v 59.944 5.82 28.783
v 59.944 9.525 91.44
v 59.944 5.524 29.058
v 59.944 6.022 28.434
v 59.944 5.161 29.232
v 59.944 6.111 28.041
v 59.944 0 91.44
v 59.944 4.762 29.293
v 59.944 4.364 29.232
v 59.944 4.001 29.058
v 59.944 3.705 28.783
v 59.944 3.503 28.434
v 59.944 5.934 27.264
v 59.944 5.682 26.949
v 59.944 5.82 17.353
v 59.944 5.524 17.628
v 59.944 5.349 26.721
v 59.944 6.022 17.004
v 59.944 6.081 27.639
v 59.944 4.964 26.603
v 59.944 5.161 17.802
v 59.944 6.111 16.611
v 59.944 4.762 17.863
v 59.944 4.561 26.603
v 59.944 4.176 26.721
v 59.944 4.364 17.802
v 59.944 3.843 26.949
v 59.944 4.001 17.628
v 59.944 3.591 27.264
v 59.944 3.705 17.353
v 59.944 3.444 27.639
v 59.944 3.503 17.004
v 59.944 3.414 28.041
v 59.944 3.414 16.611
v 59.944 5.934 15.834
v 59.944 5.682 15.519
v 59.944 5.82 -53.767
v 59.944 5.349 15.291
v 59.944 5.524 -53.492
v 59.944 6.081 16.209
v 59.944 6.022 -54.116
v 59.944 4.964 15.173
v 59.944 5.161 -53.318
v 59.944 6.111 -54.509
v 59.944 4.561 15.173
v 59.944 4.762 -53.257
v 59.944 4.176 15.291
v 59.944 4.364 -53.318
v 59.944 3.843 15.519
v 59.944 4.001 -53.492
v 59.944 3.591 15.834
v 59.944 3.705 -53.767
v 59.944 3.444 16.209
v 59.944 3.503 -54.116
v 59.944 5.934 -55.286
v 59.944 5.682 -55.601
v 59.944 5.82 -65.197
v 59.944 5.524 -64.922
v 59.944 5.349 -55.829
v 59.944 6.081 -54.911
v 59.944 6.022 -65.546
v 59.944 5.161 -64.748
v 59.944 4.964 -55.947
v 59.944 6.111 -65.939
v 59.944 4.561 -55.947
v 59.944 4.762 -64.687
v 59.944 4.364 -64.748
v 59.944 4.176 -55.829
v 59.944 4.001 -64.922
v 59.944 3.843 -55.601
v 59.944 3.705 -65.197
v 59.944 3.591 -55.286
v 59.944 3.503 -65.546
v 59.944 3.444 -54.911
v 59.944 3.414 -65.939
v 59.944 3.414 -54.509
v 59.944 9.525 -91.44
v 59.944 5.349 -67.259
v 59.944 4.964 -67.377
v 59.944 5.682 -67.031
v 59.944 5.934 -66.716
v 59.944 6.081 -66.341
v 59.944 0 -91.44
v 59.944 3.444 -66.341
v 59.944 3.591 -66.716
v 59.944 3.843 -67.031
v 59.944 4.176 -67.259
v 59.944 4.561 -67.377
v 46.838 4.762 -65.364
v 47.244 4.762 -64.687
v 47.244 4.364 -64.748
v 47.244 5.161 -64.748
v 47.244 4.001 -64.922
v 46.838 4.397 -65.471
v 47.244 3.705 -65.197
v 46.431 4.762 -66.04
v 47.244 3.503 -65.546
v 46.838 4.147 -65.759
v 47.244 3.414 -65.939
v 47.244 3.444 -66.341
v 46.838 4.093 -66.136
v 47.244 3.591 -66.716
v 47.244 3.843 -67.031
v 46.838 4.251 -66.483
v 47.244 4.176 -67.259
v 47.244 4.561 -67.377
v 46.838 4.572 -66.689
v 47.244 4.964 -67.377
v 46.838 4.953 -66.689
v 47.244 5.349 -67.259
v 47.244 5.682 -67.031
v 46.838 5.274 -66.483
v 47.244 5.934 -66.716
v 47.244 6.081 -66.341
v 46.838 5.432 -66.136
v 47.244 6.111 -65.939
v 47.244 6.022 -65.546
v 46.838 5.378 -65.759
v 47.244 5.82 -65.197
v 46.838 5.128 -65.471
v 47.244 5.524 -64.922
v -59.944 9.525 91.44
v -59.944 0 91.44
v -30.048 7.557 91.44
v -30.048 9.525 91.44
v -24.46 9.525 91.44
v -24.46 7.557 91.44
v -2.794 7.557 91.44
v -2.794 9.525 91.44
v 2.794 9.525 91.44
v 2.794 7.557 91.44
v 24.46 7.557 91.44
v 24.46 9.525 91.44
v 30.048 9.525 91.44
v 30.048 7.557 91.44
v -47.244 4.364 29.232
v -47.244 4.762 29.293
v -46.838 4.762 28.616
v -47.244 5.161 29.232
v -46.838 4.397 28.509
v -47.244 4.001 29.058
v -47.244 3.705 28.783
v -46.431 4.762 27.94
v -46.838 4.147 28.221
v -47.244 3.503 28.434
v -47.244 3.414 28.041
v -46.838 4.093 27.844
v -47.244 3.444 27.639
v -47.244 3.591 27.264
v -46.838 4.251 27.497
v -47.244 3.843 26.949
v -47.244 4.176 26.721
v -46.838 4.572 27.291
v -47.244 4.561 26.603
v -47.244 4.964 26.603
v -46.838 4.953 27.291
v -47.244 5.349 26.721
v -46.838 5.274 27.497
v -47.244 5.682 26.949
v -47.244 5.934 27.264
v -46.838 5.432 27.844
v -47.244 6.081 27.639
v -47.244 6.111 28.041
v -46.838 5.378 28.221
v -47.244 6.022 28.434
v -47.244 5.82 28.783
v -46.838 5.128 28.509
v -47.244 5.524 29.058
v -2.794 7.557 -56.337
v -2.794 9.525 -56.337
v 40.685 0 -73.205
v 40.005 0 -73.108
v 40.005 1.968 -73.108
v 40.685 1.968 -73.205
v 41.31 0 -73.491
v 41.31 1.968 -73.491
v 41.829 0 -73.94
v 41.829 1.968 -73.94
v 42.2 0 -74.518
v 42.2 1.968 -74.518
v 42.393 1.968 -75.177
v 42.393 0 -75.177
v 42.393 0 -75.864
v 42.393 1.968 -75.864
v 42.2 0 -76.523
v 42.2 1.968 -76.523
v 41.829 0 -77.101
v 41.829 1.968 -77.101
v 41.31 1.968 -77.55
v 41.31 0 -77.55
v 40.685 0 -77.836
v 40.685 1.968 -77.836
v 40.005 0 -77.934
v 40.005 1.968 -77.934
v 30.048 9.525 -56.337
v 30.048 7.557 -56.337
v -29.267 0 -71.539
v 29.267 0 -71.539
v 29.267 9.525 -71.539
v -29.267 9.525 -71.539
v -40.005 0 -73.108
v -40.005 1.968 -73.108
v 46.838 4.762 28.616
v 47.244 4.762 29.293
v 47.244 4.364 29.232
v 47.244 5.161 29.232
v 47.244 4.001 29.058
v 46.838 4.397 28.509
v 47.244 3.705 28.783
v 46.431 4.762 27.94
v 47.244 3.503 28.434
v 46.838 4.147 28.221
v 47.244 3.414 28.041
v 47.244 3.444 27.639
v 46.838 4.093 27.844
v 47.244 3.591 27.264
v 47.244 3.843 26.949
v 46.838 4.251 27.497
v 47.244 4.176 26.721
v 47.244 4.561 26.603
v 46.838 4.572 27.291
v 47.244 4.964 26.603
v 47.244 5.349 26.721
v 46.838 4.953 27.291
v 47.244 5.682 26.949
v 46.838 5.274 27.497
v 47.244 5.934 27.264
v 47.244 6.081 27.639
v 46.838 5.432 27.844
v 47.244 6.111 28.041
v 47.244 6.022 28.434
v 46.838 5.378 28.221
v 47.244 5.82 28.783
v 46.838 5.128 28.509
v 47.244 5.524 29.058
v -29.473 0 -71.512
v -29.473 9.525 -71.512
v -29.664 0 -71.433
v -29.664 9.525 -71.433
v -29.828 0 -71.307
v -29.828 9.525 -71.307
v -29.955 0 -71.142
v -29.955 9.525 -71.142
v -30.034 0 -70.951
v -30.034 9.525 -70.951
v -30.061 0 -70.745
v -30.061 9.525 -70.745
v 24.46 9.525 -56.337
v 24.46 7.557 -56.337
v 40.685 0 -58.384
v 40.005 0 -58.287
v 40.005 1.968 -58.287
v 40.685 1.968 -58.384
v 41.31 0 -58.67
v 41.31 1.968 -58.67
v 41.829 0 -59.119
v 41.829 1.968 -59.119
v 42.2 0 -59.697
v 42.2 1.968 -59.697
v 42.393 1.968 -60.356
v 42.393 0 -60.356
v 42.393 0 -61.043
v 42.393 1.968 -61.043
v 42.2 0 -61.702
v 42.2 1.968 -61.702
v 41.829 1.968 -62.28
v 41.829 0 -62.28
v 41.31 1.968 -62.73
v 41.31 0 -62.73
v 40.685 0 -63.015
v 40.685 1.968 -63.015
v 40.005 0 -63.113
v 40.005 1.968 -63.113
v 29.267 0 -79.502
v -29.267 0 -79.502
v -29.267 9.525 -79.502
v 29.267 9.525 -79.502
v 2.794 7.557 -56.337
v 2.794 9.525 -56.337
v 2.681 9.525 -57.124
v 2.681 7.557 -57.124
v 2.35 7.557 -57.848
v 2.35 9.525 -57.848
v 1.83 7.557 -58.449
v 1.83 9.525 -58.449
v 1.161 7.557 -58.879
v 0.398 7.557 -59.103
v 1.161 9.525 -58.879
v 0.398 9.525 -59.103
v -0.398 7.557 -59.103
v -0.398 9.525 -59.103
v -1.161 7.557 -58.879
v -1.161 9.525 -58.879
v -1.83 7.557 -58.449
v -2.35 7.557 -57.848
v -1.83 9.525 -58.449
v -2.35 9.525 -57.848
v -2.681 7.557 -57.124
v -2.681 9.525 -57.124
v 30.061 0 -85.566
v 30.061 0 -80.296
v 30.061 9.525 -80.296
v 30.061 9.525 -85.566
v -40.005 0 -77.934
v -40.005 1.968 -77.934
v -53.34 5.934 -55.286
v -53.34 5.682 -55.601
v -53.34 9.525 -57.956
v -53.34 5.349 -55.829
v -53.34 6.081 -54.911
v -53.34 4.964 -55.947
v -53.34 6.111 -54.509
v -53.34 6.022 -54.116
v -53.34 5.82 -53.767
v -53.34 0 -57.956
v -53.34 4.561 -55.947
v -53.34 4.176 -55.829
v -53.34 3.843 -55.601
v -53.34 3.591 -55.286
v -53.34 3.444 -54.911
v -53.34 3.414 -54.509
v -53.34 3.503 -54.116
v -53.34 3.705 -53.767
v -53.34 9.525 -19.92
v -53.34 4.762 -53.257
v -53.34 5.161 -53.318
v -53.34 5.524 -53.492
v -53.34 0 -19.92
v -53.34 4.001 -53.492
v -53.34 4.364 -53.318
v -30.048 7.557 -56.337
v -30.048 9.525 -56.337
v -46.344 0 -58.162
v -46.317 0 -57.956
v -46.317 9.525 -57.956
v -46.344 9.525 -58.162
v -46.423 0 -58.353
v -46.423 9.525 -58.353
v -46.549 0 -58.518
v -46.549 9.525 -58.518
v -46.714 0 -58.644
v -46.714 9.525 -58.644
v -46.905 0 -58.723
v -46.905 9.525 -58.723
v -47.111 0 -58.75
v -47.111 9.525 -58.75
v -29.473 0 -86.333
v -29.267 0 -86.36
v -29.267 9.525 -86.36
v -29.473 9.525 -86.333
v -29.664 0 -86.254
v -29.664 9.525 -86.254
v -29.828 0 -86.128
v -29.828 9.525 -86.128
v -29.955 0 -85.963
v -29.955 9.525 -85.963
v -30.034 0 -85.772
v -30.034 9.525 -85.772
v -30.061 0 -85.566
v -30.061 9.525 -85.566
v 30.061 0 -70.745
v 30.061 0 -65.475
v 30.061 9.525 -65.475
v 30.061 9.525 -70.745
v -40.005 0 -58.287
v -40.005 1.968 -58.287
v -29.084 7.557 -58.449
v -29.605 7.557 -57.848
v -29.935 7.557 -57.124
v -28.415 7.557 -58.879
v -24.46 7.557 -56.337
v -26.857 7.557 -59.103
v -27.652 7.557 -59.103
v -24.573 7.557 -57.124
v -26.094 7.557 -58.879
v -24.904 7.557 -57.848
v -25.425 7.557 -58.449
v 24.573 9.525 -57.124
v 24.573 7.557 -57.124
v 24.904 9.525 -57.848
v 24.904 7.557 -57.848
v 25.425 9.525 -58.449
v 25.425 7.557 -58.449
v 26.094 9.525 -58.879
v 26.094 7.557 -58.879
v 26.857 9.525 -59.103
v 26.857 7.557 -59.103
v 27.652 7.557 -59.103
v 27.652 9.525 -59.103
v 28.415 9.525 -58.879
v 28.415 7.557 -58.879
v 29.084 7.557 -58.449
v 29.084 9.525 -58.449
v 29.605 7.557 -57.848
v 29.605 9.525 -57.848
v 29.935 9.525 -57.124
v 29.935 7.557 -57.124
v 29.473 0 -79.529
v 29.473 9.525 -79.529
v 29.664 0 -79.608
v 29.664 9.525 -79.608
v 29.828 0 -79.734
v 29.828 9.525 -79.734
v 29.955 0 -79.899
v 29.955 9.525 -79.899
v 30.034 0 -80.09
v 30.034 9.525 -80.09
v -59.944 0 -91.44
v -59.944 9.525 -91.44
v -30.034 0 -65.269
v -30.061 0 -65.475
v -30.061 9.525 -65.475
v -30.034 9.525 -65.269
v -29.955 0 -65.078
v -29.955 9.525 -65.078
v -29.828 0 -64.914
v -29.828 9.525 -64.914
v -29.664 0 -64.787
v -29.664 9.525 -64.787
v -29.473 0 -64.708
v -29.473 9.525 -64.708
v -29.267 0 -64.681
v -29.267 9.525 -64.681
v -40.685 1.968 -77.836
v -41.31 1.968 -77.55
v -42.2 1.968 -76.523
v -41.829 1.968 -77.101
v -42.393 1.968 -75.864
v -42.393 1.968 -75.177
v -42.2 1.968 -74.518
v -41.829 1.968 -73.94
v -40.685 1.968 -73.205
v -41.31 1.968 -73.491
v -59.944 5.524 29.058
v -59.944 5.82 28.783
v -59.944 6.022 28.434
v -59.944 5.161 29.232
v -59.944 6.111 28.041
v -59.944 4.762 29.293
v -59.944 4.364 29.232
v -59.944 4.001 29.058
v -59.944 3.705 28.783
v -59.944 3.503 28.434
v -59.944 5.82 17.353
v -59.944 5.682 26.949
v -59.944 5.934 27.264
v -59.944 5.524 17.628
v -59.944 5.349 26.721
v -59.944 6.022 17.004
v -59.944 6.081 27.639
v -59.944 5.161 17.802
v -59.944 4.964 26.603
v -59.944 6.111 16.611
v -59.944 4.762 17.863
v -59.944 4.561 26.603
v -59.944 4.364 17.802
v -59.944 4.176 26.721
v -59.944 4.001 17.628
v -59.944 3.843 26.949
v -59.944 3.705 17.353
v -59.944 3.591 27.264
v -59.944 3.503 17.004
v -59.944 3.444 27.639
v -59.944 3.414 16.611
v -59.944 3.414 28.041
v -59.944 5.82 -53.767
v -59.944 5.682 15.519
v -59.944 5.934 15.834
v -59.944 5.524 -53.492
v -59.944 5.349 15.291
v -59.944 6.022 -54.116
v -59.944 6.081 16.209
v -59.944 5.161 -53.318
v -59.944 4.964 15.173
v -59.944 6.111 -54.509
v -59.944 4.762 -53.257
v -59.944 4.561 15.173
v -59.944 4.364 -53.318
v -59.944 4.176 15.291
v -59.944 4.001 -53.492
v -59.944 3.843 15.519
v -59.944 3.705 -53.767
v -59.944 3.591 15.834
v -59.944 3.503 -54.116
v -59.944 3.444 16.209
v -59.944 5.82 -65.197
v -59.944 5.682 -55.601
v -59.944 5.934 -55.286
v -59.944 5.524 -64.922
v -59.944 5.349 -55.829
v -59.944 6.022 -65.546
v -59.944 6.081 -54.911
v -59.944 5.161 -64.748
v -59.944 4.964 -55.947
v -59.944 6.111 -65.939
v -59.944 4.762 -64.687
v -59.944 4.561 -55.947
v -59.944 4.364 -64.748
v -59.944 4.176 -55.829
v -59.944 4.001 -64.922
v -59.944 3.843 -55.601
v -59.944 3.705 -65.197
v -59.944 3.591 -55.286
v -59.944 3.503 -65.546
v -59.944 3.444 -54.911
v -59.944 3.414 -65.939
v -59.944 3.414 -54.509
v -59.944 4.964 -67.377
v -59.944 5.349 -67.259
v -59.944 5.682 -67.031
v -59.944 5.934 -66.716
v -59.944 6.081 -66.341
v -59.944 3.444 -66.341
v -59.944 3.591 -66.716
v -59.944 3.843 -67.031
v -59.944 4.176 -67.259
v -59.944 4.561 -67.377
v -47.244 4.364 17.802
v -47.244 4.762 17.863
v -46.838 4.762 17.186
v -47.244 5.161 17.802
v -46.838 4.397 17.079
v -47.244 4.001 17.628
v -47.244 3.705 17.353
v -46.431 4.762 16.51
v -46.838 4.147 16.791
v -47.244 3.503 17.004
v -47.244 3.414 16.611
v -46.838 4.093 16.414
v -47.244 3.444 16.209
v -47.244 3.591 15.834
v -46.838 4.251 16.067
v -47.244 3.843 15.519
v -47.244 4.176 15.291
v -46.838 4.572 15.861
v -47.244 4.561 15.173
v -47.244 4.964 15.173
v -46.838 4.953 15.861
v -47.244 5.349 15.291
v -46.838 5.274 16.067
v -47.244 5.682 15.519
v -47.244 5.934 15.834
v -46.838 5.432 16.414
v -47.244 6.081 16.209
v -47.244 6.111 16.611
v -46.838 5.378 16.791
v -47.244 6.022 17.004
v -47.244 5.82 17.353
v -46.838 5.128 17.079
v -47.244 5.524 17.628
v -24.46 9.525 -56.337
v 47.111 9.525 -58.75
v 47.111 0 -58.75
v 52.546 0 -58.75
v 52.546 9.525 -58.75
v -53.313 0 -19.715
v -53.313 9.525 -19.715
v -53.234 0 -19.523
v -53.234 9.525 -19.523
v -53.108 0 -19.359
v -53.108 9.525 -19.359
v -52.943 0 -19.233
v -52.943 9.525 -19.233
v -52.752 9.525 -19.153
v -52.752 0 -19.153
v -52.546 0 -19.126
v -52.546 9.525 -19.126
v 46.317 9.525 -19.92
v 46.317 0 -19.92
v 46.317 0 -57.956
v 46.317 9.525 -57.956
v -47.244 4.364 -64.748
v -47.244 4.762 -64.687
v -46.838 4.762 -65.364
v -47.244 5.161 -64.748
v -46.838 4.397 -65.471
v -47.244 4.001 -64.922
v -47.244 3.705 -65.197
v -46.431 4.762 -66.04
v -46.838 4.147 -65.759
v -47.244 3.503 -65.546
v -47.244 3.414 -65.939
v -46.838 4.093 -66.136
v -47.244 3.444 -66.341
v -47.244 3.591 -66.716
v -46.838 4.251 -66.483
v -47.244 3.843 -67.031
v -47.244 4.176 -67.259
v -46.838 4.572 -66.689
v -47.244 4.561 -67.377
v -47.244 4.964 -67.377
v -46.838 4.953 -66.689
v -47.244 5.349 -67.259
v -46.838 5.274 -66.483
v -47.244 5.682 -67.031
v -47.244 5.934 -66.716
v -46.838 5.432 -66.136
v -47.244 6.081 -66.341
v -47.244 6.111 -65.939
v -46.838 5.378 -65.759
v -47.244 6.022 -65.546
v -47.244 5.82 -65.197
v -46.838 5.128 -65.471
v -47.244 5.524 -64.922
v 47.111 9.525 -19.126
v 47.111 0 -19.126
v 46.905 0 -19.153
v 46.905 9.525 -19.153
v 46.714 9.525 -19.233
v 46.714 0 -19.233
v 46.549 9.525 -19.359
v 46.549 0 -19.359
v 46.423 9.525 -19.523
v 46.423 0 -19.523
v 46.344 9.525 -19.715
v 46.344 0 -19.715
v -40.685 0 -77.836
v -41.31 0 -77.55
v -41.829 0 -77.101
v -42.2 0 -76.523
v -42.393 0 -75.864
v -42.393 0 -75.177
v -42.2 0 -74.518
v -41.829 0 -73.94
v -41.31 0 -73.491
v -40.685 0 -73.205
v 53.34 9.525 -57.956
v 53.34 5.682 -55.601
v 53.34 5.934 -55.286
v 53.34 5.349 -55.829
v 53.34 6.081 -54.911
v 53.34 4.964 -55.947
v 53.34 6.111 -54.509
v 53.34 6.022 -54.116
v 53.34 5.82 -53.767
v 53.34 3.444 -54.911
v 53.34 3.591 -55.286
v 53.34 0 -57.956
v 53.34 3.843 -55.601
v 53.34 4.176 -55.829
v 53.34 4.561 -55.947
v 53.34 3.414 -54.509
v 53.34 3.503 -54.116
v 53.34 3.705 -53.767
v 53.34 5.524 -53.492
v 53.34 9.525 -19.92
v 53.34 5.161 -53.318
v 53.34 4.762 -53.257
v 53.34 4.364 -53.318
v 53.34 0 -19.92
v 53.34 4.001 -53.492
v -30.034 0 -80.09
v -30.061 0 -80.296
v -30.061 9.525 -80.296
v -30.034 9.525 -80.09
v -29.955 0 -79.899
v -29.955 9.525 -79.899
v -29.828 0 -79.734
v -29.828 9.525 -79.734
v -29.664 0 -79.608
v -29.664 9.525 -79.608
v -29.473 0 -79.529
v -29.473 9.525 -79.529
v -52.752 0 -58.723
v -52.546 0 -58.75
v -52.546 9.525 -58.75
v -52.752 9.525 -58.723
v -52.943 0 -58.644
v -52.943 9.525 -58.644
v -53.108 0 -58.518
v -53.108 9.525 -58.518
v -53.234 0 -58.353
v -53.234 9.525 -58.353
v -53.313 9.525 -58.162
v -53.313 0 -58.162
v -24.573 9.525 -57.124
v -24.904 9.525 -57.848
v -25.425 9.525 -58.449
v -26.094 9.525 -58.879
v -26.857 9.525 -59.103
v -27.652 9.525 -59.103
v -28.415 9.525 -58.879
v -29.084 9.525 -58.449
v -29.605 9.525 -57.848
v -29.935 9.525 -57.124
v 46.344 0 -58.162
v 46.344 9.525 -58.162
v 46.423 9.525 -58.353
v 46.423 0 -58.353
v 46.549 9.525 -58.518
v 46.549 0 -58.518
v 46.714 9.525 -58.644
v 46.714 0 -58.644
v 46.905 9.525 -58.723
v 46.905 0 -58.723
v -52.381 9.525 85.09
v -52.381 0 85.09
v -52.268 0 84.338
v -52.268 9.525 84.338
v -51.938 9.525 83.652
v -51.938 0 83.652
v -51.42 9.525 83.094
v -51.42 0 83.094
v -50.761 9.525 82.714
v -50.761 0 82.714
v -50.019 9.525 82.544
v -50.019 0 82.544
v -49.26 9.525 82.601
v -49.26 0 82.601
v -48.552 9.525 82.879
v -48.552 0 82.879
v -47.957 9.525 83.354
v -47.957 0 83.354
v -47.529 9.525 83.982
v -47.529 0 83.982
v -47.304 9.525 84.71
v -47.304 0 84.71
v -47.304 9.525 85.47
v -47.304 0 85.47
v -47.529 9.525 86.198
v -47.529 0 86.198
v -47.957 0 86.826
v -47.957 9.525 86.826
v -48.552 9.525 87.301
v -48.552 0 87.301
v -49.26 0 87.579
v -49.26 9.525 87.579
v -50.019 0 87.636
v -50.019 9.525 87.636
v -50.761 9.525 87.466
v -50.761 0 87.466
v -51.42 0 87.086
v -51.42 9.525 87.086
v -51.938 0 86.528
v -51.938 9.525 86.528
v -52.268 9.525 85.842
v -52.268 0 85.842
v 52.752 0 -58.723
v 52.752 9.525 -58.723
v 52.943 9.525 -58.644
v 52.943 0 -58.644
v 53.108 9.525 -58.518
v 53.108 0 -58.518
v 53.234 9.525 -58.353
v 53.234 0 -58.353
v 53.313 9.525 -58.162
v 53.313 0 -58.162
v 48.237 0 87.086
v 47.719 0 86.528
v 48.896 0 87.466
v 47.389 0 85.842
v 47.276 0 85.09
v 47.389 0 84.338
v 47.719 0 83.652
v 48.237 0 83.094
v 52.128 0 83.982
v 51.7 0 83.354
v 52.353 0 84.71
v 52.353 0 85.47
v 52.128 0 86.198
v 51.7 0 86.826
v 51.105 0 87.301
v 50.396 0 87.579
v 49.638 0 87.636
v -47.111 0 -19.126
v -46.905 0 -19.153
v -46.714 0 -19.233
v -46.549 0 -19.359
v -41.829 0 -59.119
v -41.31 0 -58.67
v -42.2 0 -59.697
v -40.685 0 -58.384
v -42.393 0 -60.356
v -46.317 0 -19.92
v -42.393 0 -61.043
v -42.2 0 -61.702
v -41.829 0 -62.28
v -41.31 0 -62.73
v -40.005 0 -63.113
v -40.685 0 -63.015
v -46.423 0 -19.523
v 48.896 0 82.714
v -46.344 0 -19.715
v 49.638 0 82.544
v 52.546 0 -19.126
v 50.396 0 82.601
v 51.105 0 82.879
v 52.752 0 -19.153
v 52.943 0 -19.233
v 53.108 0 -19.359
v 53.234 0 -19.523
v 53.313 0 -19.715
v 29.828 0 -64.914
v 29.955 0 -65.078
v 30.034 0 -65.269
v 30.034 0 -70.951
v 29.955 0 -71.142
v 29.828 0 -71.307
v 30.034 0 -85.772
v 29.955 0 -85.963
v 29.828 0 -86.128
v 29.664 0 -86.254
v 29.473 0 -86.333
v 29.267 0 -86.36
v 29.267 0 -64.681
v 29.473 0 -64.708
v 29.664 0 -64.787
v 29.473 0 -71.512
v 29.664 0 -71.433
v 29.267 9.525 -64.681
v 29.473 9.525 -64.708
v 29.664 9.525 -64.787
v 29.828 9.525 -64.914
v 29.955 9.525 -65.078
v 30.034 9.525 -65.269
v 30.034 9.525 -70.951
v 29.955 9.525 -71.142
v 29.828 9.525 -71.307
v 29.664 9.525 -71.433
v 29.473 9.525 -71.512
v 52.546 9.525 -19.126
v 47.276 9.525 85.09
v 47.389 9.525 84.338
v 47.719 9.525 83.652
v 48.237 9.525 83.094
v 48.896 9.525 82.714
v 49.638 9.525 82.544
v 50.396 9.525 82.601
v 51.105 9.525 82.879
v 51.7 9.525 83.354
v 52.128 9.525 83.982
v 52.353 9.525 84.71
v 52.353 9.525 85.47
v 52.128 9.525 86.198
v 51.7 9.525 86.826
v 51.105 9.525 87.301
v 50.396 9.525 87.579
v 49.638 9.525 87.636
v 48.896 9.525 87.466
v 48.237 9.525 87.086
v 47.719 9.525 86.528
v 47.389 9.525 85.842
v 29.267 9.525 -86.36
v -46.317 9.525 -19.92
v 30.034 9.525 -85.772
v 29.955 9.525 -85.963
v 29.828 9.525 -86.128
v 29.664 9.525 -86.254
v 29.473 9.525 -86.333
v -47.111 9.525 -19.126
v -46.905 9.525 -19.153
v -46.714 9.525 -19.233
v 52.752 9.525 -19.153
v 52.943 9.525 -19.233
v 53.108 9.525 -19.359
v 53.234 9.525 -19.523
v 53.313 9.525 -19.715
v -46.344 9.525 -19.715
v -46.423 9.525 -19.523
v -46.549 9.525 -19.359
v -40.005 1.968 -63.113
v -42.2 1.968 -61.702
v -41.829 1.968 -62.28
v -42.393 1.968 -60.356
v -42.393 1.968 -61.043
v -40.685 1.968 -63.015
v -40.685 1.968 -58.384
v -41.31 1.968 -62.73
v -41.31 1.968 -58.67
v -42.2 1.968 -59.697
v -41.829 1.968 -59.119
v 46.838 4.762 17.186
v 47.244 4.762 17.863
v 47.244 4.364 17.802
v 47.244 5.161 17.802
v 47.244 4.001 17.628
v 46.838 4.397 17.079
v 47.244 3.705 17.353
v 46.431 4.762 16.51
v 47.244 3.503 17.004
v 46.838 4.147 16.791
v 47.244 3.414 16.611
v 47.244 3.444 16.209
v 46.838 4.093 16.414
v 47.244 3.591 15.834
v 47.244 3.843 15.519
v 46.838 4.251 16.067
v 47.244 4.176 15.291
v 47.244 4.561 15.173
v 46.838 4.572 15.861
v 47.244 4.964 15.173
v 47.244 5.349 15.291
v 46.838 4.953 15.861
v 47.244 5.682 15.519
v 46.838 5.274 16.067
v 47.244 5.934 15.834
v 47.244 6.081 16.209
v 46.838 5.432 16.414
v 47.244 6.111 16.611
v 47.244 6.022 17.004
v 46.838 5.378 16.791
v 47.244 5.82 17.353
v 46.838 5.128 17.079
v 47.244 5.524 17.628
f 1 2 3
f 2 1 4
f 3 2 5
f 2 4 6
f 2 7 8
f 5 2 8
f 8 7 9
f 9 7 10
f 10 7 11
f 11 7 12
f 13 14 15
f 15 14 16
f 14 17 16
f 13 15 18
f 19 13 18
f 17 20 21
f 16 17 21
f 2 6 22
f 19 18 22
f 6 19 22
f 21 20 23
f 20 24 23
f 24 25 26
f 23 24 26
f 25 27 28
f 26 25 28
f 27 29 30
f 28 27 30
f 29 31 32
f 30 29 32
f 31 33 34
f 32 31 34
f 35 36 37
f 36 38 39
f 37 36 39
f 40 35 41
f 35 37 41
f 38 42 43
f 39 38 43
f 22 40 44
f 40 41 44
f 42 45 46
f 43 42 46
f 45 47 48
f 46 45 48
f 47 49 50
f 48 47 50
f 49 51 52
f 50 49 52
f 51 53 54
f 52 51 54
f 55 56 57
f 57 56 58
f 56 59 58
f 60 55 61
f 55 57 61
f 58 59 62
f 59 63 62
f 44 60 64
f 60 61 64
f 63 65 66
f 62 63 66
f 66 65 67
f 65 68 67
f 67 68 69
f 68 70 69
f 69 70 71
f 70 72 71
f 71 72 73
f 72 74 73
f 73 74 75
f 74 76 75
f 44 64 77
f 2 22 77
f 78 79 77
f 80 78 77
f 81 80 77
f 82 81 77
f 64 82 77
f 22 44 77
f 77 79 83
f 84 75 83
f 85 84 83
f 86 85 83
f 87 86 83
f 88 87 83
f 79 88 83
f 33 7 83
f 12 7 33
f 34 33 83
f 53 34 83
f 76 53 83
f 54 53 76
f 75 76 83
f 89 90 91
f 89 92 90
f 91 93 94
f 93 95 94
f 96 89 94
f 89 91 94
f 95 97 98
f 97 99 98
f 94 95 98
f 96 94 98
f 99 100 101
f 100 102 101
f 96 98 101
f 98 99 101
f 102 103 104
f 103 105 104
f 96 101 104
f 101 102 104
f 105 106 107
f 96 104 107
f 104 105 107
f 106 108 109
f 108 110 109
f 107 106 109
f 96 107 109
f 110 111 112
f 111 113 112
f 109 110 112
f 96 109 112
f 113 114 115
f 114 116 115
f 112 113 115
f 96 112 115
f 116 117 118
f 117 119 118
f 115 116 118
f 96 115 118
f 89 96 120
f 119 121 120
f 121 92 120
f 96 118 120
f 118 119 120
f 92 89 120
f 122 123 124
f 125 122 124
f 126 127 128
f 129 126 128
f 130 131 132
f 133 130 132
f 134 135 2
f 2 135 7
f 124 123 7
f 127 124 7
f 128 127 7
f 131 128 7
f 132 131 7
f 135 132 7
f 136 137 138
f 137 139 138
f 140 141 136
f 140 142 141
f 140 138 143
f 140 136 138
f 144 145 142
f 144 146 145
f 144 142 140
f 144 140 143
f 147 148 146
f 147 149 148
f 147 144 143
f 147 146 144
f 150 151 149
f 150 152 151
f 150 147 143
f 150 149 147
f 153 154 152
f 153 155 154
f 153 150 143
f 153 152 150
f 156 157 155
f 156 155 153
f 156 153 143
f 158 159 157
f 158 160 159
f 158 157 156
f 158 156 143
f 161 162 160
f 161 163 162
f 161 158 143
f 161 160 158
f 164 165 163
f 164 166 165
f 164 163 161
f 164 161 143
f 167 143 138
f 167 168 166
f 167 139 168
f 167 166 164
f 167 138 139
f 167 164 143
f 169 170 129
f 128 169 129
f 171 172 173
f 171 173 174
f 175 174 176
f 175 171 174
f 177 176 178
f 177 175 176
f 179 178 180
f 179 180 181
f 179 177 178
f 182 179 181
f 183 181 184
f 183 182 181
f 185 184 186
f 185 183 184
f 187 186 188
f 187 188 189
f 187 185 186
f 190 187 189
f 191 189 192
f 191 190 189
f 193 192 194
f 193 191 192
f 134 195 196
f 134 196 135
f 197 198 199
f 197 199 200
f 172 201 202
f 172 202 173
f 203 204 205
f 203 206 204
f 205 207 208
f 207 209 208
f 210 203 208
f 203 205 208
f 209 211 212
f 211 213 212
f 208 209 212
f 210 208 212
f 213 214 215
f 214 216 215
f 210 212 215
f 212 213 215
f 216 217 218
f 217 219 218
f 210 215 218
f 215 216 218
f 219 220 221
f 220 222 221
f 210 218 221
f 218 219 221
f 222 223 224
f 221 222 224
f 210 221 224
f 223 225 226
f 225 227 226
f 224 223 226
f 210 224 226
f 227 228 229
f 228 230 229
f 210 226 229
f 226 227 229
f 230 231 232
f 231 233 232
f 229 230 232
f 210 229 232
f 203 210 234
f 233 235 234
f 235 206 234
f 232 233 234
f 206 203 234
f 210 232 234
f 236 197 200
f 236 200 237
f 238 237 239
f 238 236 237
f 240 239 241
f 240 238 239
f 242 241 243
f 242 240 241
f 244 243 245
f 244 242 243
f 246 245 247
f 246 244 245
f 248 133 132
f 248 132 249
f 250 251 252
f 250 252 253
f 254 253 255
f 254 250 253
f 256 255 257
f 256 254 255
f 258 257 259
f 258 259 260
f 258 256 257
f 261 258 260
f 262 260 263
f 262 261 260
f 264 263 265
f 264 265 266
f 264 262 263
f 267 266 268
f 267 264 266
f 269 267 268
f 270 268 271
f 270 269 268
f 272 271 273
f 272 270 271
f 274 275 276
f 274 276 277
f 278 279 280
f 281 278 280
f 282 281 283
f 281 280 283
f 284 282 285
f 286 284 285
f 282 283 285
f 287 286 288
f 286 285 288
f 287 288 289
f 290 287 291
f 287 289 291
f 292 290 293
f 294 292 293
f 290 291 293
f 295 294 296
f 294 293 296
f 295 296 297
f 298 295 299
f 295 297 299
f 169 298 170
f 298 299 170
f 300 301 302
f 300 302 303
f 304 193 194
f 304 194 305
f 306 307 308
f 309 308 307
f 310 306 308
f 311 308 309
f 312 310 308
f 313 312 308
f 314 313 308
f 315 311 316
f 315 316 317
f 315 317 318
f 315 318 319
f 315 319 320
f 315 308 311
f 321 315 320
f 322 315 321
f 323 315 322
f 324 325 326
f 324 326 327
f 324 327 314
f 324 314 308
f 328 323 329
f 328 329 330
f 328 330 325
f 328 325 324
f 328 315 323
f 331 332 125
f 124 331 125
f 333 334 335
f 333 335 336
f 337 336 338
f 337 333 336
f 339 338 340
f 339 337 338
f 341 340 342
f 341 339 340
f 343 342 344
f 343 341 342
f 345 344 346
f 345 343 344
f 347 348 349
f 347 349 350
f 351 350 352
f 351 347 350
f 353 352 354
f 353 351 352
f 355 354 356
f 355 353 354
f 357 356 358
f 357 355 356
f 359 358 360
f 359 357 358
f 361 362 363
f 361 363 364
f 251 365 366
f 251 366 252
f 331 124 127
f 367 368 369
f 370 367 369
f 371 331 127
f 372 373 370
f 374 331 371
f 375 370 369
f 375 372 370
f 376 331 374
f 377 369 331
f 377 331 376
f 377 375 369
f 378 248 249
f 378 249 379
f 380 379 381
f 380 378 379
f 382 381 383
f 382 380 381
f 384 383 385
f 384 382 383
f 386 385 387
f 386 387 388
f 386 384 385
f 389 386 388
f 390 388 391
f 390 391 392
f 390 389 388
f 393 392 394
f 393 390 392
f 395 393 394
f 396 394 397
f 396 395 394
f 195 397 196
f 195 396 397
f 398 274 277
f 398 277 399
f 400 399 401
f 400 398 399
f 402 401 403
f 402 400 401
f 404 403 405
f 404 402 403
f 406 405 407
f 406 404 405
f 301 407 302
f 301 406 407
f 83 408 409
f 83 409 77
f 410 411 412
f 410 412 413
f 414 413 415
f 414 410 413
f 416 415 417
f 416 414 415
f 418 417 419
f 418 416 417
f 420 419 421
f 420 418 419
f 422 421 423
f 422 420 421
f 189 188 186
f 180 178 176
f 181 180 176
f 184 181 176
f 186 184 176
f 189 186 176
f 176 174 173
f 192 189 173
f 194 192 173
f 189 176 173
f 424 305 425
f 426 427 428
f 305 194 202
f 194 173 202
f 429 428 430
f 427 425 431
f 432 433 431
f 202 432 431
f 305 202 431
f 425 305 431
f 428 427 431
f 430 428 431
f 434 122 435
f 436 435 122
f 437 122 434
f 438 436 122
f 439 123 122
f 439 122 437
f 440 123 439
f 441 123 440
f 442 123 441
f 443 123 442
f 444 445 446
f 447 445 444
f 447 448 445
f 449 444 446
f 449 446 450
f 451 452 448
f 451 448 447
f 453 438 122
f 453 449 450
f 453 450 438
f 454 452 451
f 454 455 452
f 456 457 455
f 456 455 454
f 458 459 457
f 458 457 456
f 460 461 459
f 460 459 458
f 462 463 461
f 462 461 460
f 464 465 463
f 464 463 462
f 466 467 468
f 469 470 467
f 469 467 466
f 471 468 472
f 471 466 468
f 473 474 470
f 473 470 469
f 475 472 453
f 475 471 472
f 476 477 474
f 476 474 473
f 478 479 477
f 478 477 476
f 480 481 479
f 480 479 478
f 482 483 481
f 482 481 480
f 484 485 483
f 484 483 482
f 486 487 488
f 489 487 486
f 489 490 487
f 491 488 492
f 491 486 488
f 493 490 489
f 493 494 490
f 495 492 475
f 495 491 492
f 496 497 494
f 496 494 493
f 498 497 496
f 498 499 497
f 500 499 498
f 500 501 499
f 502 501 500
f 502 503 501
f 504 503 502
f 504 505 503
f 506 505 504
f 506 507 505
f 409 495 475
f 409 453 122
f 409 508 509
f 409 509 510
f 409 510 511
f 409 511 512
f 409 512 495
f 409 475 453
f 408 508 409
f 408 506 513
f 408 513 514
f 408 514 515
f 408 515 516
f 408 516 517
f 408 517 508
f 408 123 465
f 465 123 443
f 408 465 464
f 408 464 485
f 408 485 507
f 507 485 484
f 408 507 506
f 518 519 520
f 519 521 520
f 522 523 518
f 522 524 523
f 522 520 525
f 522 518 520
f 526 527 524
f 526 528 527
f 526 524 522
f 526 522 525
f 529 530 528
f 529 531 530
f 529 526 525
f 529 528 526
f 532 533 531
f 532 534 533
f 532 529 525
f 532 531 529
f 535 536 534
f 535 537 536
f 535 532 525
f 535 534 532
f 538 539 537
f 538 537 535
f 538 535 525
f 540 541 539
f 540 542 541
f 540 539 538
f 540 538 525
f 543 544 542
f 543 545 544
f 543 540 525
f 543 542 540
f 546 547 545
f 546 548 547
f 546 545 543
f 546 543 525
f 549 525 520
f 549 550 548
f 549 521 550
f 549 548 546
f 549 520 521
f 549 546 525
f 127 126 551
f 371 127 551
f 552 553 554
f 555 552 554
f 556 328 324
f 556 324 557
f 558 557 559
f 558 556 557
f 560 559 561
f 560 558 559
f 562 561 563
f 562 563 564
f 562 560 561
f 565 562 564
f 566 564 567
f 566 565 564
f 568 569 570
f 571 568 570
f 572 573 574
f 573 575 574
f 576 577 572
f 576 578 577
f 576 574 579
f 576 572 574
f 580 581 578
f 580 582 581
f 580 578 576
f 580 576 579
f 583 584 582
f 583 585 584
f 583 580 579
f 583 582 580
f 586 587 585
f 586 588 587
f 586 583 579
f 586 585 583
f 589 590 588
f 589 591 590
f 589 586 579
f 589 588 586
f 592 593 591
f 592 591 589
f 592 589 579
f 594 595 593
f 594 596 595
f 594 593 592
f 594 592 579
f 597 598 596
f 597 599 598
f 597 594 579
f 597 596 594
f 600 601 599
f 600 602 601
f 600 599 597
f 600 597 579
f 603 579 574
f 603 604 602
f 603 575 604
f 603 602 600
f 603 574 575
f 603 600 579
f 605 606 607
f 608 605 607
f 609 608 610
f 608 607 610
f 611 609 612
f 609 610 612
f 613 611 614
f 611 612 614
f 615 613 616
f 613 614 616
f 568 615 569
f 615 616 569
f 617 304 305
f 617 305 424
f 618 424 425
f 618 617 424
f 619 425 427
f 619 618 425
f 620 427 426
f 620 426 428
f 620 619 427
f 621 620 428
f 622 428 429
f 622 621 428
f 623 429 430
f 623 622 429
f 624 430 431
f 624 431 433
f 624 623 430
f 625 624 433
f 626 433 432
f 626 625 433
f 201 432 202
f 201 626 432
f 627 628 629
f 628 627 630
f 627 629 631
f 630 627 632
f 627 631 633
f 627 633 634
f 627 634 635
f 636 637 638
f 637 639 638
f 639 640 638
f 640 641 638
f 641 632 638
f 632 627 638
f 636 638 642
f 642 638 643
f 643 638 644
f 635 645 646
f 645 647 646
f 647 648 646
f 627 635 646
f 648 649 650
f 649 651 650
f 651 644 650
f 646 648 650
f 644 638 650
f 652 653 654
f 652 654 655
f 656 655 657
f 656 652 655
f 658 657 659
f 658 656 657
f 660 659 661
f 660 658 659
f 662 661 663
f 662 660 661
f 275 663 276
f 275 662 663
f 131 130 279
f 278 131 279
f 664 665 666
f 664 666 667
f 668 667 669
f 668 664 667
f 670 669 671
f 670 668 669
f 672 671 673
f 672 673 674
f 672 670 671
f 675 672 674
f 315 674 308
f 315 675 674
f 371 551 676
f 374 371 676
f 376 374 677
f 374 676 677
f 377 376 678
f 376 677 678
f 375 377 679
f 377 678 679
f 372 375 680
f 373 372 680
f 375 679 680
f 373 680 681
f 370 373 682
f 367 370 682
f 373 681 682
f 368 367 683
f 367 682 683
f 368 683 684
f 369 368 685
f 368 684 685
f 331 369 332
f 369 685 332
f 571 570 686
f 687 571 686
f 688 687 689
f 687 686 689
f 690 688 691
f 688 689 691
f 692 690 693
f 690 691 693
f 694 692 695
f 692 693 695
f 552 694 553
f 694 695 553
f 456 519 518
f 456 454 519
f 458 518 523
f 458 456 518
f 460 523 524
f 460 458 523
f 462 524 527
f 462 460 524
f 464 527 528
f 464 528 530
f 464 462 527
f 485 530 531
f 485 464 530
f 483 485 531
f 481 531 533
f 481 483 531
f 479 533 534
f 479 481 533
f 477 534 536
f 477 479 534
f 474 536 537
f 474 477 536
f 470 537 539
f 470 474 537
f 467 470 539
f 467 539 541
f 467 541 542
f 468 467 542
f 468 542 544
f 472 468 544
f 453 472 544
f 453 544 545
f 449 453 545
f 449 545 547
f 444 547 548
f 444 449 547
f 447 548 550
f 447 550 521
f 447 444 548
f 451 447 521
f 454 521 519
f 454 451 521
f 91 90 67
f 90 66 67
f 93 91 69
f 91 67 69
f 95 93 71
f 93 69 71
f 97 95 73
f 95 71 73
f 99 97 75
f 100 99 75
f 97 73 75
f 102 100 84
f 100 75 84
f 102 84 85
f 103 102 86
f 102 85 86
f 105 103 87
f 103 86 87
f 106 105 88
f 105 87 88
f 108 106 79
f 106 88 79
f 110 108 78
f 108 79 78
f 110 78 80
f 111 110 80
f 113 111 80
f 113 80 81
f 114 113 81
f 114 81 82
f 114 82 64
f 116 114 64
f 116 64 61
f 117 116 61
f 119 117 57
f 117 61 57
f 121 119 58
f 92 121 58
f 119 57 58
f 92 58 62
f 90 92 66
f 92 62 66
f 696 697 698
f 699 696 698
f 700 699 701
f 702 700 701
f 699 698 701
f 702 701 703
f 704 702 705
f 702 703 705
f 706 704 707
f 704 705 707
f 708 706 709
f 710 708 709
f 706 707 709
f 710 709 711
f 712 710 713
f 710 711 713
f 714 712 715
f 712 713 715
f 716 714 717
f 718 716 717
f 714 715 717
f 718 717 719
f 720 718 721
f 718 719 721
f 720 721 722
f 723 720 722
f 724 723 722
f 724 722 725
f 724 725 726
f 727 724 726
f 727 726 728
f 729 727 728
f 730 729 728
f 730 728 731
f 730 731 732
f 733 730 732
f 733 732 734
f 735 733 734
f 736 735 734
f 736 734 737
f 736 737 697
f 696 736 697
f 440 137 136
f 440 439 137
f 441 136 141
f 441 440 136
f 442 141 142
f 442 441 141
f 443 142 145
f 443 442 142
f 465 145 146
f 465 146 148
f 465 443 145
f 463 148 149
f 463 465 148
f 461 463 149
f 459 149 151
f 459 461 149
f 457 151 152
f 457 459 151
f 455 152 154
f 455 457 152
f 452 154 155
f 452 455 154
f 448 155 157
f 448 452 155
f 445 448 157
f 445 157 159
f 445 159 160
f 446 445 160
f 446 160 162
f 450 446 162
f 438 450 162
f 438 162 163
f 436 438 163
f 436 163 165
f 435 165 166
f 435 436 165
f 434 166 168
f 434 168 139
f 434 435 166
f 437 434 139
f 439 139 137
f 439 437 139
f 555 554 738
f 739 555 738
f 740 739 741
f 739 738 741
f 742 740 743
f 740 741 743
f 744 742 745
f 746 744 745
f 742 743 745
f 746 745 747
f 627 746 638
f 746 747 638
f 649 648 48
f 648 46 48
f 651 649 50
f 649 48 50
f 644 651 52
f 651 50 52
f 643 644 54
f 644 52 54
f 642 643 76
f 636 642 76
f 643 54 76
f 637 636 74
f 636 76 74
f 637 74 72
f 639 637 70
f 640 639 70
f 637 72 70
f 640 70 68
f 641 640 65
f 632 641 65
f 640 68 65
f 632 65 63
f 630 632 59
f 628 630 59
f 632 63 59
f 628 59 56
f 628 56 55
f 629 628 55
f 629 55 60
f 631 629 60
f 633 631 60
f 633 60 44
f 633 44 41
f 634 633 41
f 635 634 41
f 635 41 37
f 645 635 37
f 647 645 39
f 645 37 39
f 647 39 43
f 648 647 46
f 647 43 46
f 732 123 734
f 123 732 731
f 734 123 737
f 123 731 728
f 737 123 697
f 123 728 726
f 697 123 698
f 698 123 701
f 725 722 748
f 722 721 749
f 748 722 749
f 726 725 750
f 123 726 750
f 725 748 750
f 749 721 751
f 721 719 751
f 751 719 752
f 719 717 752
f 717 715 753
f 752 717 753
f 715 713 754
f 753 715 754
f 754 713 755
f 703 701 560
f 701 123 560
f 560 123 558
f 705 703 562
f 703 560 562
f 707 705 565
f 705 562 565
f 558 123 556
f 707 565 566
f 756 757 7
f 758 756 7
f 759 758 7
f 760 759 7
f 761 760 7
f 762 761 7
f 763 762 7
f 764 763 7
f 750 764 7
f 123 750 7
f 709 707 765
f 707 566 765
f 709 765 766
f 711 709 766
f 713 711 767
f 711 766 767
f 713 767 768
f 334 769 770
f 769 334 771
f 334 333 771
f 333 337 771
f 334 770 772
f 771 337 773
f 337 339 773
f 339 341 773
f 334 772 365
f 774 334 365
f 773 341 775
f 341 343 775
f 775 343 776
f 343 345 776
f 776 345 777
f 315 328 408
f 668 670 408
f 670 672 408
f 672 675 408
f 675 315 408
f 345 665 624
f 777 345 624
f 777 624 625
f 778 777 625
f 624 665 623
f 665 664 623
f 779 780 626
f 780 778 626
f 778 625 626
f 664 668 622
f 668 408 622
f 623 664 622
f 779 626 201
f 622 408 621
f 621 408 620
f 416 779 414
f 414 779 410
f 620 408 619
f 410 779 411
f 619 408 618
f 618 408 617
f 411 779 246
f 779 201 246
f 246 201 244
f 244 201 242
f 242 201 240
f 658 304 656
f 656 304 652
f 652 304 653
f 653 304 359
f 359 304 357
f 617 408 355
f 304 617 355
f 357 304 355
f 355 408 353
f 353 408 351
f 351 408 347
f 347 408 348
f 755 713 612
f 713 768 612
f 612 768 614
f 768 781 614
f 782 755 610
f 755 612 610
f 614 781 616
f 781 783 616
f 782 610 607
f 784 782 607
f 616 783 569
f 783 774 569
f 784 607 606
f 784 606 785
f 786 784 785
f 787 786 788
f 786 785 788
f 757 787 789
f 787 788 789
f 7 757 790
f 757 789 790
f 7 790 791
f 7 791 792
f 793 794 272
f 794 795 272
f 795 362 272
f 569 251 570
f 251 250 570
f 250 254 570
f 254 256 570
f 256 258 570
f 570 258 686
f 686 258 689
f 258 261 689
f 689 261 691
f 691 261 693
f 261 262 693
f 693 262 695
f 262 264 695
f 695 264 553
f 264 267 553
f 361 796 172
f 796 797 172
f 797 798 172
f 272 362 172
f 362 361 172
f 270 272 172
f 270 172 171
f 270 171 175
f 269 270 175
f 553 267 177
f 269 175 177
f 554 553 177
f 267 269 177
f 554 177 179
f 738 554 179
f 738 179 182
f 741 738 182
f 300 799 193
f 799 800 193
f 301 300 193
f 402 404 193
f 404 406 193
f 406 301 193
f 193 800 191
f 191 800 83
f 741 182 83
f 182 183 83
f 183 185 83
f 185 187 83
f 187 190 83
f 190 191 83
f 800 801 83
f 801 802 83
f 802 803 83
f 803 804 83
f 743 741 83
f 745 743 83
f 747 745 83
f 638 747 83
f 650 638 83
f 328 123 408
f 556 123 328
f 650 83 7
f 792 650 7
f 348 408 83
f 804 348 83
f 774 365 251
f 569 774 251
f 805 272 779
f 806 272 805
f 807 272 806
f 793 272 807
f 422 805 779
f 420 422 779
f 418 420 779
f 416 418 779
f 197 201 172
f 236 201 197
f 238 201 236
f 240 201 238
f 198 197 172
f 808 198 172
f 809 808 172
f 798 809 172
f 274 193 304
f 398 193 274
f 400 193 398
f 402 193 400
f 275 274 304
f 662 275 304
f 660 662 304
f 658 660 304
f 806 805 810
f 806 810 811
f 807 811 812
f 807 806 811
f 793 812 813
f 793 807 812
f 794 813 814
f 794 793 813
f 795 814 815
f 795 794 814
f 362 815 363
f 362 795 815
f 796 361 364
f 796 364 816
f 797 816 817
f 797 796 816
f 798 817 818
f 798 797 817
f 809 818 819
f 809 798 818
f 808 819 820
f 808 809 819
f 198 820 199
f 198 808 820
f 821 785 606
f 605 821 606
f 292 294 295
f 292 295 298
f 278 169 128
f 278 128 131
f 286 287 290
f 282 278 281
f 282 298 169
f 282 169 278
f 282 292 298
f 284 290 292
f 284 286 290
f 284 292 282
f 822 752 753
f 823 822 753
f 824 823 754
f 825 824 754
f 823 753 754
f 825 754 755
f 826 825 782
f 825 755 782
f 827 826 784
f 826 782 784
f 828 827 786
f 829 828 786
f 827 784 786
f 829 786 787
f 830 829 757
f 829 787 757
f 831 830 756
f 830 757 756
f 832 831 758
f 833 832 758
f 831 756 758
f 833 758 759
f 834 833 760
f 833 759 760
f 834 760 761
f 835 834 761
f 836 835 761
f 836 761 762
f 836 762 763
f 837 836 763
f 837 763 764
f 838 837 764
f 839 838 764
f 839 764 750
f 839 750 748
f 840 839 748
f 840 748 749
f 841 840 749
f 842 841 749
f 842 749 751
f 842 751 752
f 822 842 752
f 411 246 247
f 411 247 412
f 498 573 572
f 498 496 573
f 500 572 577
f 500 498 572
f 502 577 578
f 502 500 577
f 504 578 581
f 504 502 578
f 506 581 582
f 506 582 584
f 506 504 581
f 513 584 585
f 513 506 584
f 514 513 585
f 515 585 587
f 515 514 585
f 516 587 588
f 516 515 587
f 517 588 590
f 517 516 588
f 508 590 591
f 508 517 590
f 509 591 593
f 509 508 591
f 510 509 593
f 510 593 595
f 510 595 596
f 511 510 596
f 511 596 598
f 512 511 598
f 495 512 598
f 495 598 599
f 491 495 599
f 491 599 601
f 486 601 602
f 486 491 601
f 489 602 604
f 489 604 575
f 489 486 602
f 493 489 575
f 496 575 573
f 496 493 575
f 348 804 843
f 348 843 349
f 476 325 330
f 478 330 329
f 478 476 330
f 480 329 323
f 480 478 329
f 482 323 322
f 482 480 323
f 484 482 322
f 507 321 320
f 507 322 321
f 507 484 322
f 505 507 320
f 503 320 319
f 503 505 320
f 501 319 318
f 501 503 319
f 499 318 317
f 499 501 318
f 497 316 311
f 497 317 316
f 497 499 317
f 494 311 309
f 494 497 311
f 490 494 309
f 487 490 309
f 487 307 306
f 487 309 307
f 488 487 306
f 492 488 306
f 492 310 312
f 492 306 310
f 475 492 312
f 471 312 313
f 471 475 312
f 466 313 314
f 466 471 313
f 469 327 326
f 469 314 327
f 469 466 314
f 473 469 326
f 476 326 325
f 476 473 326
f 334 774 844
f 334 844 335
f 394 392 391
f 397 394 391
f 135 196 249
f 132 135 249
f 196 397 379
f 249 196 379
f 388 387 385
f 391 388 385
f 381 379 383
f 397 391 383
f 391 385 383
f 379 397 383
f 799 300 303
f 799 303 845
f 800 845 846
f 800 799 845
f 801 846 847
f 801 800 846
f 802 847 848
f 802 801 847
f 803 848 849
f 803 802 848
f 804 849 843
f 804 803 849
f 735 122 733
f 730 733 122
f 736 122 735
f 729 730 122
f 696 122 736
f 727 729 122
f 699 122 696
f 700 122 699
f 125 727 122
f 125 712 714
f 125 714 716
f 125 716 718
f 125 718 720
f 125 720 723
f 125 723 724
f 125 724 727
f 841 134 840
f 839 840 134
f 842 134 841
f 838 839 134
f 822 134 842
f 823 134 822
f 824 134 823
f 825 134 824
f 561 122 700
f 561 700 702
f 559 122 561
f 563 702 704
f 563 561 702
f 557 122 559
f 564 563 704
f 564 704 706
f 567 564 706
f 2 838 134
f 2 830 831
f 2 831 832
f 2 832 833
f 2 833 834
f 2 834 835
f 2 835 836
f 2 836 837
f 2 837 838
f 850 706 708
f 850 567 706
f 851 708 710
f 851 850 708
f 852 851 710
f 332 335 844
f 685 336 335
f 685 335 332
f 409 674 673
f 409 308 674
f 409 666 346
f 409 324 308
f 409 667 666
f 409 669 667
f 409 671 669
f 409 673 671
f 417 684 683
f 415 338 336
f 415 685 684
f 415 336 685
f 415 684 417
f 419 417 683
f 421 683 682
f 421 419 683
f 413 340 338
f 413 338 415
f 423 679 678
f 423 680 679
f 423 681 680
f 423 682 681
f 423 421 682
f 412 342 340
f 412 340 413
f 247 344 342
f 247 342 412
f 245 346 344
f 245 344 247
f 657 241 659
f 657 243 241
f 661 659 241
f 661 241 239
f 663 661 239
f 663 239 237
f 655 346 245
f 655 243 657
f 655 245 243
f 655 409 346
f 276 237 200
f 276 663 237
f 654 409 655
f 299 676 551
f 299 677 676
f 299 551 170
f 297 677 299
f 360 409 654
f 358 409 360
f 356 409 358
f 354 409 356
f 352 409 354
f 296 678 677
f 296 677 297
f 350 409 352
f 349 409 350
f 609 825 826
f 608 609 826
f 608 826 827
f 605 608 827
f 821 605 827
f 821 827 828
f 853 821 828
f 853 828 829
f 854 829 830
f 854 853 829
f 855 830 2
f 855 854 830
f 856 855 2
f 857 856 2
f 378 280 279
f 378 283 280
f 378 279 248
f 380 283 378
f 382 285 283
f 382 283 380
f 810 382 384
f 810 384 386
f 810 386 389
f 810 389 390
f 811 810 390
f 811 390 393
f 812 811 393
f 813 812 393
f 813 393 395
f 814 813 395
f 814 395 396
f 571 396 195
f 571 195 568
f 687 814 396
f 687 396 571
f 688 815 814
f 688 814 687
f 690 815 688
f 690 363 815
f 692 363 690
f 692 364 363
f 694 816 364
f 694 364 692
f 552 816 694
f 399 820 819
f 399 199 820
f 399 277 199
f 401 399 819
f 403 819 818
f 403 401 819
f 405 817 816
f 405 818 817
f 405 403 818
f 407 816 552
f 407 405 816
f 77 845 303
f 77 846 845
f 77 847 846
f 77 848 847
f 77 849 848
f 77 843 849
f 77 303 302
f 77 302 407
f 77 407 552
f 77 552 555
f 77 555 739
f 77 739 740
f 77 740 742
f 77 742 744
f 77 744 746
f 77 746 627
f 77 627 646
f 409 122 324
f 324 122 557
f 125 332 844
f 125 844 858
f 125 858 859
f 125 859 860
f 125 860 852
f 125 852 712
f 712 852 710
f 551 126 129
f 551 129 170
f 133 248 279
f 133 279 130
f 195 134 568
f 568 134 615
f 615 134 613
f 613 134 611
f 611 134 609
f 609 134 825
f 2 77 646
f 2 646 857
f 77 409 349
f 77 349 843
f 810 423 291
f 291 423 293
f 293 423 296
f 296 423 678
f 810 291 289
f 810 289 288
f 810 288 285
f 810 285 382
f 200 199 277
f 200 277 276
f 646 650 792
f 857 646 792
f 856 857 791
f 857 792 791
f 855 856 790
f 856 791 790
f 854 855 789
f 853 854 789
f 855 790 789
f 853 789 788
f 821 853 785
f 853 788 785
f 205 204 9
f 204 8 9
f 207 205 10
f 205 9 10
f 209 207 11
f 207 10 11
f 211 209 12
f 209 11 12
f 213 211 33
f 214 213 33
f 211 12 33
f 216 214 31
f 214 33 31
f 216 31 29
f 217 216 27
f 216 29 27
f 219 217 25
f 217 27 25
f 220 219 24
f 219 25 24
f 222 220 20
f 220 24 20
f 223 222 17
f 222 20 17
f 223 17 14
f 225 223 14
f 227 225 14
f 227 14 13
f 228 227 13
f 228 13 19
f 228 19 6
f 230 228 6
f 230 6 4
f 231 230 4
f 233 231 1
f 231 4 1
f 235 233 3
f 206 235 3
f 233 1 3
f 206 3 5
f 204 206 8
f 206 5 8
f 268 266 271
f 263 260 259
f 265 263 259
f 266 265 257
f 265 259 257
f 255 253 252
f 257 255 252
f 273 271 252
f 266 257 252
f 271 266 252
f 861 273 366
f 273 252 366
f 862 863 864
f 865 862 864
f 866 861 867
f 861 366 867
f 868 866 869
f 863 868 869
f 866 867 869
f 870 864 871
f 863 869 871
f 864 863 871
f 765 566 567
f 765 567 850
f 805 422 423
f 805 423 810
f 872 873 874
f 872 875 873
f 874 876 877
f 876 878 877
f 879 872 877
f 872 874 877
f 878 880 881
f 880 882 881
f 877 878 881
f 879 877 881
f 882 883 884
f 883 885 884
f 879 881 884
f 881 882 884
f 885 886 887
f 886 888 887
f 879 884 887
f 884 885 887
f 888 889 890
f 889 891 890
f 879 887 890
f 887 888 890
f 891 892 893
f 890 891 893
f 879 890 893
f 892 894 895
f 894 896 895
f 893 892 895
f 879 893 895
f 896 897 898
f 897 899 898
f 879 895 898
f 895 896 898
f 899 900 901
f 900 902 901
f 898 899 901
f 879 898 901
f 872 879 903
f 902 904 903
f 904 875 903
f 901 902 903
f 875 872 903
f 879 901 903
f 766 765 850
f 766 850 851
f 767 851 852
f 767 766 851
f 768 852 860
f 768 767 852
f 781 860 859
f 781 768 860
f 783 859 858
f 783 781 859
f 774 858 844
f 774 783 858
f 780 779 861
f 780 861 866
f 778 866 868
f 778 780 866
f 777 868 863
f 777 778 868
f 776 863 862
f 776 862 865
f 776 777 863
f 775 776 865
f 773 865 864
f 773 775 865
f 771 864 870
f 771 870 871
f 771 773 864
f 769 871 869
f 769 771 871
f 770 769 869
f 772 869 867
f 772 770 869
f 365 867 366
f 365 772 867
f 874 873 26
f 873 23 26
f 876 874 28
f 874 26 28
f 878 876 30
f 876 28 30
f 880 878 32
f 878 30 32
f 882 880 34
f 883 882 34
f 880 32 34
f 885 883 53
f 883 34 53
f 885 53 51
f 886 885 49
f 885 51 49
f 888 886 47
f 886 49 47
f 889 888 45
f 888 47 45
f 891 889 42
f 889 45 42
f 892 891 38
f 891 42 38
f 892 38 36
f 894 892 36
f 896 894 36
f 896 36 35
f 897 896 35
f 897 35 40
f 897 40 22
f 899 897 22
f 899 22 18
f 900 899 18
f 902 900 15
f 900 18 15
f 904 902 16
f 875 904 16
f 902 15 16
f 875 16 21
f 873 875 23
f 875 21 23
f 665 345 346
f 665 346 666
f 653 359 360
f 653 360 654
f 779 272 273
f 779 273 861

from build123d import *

# Parameters (mm, degrees)
SKETCH1_W                      = 119.888
SKETCH1_H                      = 182.88
BOSS_EXTRUDE1_DEPTH            = 9.525
F_1_4_20_TAPPED_HOLE1_D        = 5.1054
CUT_EXTRUDE1_DEPTH             = 1.9685
CUT_EXTRUDE2_DEPTH             = 1.9685
F_6_32_TAPPED_HOLE1_AT_2_COUNT = 2
F_6_32_TAPPED_HOLE1_AT_2_PITCH = 93.98
F_6_32_TAPPED_HOLE1_AT_3_COUNT = 2
F_6_32_TAPPED_HOLE1_AT_3_PITCH = 82.55
F_6_32_TAPPED_HOLE1_AT_4_COUNT = 2
F_6_32_TAPPED_HOLE1_AT_4_PITCH = 11.43


with BuildPart() as part:
    # Sketch1 → Boss-Extrude1 (new body)
    with BuildSketch(Plane(origin=(0, 0, 0), x_dir=(1, 0, 0), z_dir=(0, 1, 0))):
        Rectangle(SKETCH1_W, SKETCH1_H)
        with BuildLine():
            Line((-29.26715, 79.502), (29.26715, 79.502))
            ThreePointArc((29.26715, 79.502), (29.828416008, 79.734483992), (30.0609, 80.29575))
            Line((30.0609, 80.29575), (30.0609, 85.56625))
            ThreePointArc((30.0609, 85.56625), (29.828416008, 86.127516008), (29.26715, 86.36))
            Line((29.26715, 86.36), (-29.26715, 86.36))
            ThreePointArc((-29.26715, 86.36), (-29.828416008, 86.127516008), (-30.0609, 85.56625))
            Line((-30.0609, 85.56625), (-30.0609, 80.29575))
            ThreePointArc((-30.0609, 80.29575), (-29.828416008, 79.734483992), (-29.26715, 79.502))
        make_face(mode=Mode.SUBTRACT)
        with BuildLine():
            Line((-29.26715, 64.6811), (29.26715, 64.6811))
            ThreePointArc((29.26715, 64.6811), (29.828416008, 64.913583992), (30.0609, 65.47485))
            Line((30.0609, 65.47485), (30.0609, 70.74535))
            ThreePointArc((30.0609, 70.74535), (29.828416008, 71.306616008), (29.26715, 71.5391))
            Line((29.26715, 71.5391), (-29.26715, 71.5391))
            ThreePointArc((-29.26715, 71.5391), (-29.828416008, 71.306616008), (-30.0609, 70.74535))
            Line((-30.0609, 70.74535), (-30.0609, 65.47485))
            ThreePointArc((-30.0609, 65.47485), (-29.828416008, 64.913583992), (-29.26715, 64.6811))
        make_face(mode=Mode.SUBTRACT)
        with BuildLine():
            Line((-52.54625, 19.1262), (-47.11065, 19.1262))
            ThreePointArc((-47.11065, 19.1262), (-46.549383992, 19.358683992), (-46.3169, 19.91995))
            Line((-46.3169, 19.91995), (-46.3169, 57.95645))
            ThreePointArc((-46.3169, 57.95645), (-46.549383992, 58.517716008), (-47.11065, 58.7502))
            Line((-47.11065, 58.7502), (-52.54625, 58.7502))
            ThreePointArc((-52.54625, 58.7502), (-53.107516008, 58.517716008), (-53.34, 57.95645))
            Line((-53.34, 57.95645), (-53.34, 19.91995))
            ThreePointArc((-53.34, 19.91995), (-53.107516008, 19.358683992), (-52.54625, 19.1262))
        make_face(mode=Mode.SUBTRACT)
        with BuildLine():
            Line((46.3169, 19.91995), (46.3169, 57.95645))
            ThreePointArc((46.3169, 57.95645), (46.549383992, 58.517716008), (47.11065, 58.7502))
            Line((47.11065, 58.7502), (52.54625, 58.7502))
            ThreePointArc((52.54625, 58.7502), (53.107516008, 58.517716008), (53.34, 57.95645))
            Line((53.34, 57.95645), (53.34, 19.91995))
            ThreePointArc((53.34, 19.91995), (53.107516008, 19.358683992), (52.54625, 19.1262))
            Line((52.54625, 19.1262), (47.11065, 19.1262))
            ThreePointArc((47.11065, 19.1262), (46.549383992, 19.358683992), (46.3169, 19.91995))
        make_face(mode=Mode.SUBTRACT)
    extrude(amount=BOSS_EXTRUDE1_DEPTH)

    # 1/4-20 Tapped Hole1 (through all)
    with Locations(Plane(origin=(0, 9.525, 0), x_dir=(1, 0, 0), z_dir=(0, 1, 0))):
        with Locations((-49.82845, -85.09), (49.82845, -85.09)):
            Hole(F_1_4_20_TAPPED_HOLE1_D / 2)

    # Sketch4 → Cut-Extrude1 (cut)
    with BuildSketch(Plane(origin=(0, 9.525, 0), x_dir=(1, 0, 0), z_dir=(0, 1, 0))):
        with BuildLine():
            Line((-30.0482, -91.44), (-24.4602, -91.44))
            Line((-24.4602, -91.44), (-24.4602, 56.3372))
            ThreePointArc((-24.4602, 56.3372), (-27.2542, 59.1312), (-30.0482, 56.3372))
            Line((-30.0482, 56.3372), (-30.0482, -91.44))
        make_face()
        with BuildLine():
            Line((-2.794, 56.3372), (-2.794, -91.44))
            Line((-2.794, -91.44), (2.794, -91.44))
            Line((2.794, -91.44), (2.794, 56.3372))
            ThreePointArc((2.794, 56.3372), (0, 59.1312), (-2.794, 56.3372))
        make_face()
        with BuildLine():
            Line((30.0482, 56.3372), (30.0482, -91.44))
            Line((30.0482, -91.44), (24.4602, -91.44))
            Line((24.4602, -91.44), (24.4602, 56.3372))
            ThreePointArc((24.4602, 56.3372), (27.2542, 59.1312), (30.0482, 56.3372))
        make_face()
    extrude(amount=-CUT_EXTRUDE1_DEPTH, mode=Mode.SUBTRACT)

    # Sketch5 → Cut-Extrude2 (cut)
    with BuildSketch(Plane.XZ):
        with BuildLine():
            Line((-40.005, -73.10755), (40.005, -73.10755))
            ThreePointArc((40.005, -73.10755), (42.418, -75.52055), (40.005, -77.93355))
            Line((40.005, -77.93355), (-40.005, -77.93355))
            ThreePointArc((-40.005, -77.93355), (-42.418, -75.52055), (-40.005, -73.10755))
        make_face()
        with BuildLine():
            Line((-40.005, -58.28665), (40.005, -58.28665))
            ThreePointArc((40.005, -58.28665), (42.418, -60.69965), (40.005, -63.11265))
            Line((40.005, -63.11265), (-40.005, -63.11265))
            ThreePointArc((-40.005, -63.11265), (-42.418, -60.69965), (-40.005, -58.28665))
        make_face()
    extrude(amount=-CUT_EXTRUDE2_DEPTH, mode=Mode.SUBTRACT)

    # Sketch7 → #6-32 Tapped Hole1 (revolve, cut)
    with BuildSketch(Plane(origin=(-59.944, 4.7625, 27.94), x_dir=(0, 0, 1), z_dir=(0, 1, 0))):
        Polygon((0, 0), (0, 13.51269403), (1.35255, 12.7), (1.35255, 0), align=None)
    f_6_32_tapped_hole1 = revolve(axis=Axis((-66.294, 4.7625, 27.94), (1, 0, 0)), mode=Mode.SUBTRACT)

    # #6-32 Tapped Hole1 at 2: #6-32 Tapped Hole1 ×2
    with Locations(*[(0, 0, -i * F_6_32_TAPPED_HOLE1_AT_2_PITCH) for i in range(1, F_6_32_TAPPED_HOLE1_AT_2_COUNT)]):
        add(f_6_32_tapped_hole1, mode=Mode.SUBTRACT)

    # #6-32 Tapped Hole1 at 3: #6-32 Tapped Hole1 ×2
    with Locations(*[(0, 0, -i * F_6_32_TAPPED_HOLE1_AT_3_PITCH) for i in range(1, F_6_32_TAPPED_HOLE1_AT_3_COUNT)]):
        add(f_6_32_tapped_hole1, mode=Mode.SUBTRACT)

    # #6-32 Tapped Hole1 at 4: #6-32 Tapped Hole1 ×2
    with Locations(*[(0, 0, -i * F_6_32_TAPPED_HOLE1_AT_4_PITCH) for i in range(1, F_6_32_TAPPED_HOLE1_AT_4_COUNT)]):
        add(f_6_32_tapped_hole1, mode=Mode.SUBTRACT)

    # Mirror1: #6-32 Tapped Hole1 across plane
    add(f_6_32_tapped_hole1.mirror(Plane(origin=(0, 0, 0), x_dir=(0, 0, 1), z_dir=(1, 0, 0))), mode=Mode.SUBTRACT)

    # Mirror1 copy 1 sketch → Mirror1 copy 1 (revolve, cut)
    with BuildSketch(Plane(origin=(59.944, 4.7625, -66.04), x_dir=(0, 0, 1), z_dir=(0, 1, 0))):
        Polygon((0, 0), (0, -13.51269403), (1.35255, -12.7), (1.35255, 0), align=None)
    revolve(axis=Axis((66.294, 4.7625, -66.04), (1, 0, 0)), mode=Mode.SUBTRACT)

    # Mirror1 copy 2 sketch → Mirror1 copy 2 (revolve, cut)
    with BuildSketch(Plane(origin=(59.944, 4.7625, -54.61), x_dir=(0, 0, 1), z_dir=(0, 1, 0))):
        Polygon((0, 0), (0, -13.51269403), (1.35255, -12.7), (1.35255, 0), align=None)
    revolve(axis=Axis((66.294, 4.7625, -54.61), (1, 0, 0)), mode=Mode.SUBTRACT)

    # Mirror1 copy 3 sketch → Mirror1 copy 3 (revolve, cut)
    with BuildSketch(Plane(origin=(59.944, 4.7625, 16.51), x_dir=(0, 0, 1), z_dir=(0, 1, 0))):
        Polygon((0, 0), (0, -13.51269403), (1.35255, -12.7), (1.35255, 0), align=None)
    revolve(axis=Axis((66.294, 4.7625, 16.51), (1, 0, 0)), mode=Mode.SUBTRACT)


solid = part.part
